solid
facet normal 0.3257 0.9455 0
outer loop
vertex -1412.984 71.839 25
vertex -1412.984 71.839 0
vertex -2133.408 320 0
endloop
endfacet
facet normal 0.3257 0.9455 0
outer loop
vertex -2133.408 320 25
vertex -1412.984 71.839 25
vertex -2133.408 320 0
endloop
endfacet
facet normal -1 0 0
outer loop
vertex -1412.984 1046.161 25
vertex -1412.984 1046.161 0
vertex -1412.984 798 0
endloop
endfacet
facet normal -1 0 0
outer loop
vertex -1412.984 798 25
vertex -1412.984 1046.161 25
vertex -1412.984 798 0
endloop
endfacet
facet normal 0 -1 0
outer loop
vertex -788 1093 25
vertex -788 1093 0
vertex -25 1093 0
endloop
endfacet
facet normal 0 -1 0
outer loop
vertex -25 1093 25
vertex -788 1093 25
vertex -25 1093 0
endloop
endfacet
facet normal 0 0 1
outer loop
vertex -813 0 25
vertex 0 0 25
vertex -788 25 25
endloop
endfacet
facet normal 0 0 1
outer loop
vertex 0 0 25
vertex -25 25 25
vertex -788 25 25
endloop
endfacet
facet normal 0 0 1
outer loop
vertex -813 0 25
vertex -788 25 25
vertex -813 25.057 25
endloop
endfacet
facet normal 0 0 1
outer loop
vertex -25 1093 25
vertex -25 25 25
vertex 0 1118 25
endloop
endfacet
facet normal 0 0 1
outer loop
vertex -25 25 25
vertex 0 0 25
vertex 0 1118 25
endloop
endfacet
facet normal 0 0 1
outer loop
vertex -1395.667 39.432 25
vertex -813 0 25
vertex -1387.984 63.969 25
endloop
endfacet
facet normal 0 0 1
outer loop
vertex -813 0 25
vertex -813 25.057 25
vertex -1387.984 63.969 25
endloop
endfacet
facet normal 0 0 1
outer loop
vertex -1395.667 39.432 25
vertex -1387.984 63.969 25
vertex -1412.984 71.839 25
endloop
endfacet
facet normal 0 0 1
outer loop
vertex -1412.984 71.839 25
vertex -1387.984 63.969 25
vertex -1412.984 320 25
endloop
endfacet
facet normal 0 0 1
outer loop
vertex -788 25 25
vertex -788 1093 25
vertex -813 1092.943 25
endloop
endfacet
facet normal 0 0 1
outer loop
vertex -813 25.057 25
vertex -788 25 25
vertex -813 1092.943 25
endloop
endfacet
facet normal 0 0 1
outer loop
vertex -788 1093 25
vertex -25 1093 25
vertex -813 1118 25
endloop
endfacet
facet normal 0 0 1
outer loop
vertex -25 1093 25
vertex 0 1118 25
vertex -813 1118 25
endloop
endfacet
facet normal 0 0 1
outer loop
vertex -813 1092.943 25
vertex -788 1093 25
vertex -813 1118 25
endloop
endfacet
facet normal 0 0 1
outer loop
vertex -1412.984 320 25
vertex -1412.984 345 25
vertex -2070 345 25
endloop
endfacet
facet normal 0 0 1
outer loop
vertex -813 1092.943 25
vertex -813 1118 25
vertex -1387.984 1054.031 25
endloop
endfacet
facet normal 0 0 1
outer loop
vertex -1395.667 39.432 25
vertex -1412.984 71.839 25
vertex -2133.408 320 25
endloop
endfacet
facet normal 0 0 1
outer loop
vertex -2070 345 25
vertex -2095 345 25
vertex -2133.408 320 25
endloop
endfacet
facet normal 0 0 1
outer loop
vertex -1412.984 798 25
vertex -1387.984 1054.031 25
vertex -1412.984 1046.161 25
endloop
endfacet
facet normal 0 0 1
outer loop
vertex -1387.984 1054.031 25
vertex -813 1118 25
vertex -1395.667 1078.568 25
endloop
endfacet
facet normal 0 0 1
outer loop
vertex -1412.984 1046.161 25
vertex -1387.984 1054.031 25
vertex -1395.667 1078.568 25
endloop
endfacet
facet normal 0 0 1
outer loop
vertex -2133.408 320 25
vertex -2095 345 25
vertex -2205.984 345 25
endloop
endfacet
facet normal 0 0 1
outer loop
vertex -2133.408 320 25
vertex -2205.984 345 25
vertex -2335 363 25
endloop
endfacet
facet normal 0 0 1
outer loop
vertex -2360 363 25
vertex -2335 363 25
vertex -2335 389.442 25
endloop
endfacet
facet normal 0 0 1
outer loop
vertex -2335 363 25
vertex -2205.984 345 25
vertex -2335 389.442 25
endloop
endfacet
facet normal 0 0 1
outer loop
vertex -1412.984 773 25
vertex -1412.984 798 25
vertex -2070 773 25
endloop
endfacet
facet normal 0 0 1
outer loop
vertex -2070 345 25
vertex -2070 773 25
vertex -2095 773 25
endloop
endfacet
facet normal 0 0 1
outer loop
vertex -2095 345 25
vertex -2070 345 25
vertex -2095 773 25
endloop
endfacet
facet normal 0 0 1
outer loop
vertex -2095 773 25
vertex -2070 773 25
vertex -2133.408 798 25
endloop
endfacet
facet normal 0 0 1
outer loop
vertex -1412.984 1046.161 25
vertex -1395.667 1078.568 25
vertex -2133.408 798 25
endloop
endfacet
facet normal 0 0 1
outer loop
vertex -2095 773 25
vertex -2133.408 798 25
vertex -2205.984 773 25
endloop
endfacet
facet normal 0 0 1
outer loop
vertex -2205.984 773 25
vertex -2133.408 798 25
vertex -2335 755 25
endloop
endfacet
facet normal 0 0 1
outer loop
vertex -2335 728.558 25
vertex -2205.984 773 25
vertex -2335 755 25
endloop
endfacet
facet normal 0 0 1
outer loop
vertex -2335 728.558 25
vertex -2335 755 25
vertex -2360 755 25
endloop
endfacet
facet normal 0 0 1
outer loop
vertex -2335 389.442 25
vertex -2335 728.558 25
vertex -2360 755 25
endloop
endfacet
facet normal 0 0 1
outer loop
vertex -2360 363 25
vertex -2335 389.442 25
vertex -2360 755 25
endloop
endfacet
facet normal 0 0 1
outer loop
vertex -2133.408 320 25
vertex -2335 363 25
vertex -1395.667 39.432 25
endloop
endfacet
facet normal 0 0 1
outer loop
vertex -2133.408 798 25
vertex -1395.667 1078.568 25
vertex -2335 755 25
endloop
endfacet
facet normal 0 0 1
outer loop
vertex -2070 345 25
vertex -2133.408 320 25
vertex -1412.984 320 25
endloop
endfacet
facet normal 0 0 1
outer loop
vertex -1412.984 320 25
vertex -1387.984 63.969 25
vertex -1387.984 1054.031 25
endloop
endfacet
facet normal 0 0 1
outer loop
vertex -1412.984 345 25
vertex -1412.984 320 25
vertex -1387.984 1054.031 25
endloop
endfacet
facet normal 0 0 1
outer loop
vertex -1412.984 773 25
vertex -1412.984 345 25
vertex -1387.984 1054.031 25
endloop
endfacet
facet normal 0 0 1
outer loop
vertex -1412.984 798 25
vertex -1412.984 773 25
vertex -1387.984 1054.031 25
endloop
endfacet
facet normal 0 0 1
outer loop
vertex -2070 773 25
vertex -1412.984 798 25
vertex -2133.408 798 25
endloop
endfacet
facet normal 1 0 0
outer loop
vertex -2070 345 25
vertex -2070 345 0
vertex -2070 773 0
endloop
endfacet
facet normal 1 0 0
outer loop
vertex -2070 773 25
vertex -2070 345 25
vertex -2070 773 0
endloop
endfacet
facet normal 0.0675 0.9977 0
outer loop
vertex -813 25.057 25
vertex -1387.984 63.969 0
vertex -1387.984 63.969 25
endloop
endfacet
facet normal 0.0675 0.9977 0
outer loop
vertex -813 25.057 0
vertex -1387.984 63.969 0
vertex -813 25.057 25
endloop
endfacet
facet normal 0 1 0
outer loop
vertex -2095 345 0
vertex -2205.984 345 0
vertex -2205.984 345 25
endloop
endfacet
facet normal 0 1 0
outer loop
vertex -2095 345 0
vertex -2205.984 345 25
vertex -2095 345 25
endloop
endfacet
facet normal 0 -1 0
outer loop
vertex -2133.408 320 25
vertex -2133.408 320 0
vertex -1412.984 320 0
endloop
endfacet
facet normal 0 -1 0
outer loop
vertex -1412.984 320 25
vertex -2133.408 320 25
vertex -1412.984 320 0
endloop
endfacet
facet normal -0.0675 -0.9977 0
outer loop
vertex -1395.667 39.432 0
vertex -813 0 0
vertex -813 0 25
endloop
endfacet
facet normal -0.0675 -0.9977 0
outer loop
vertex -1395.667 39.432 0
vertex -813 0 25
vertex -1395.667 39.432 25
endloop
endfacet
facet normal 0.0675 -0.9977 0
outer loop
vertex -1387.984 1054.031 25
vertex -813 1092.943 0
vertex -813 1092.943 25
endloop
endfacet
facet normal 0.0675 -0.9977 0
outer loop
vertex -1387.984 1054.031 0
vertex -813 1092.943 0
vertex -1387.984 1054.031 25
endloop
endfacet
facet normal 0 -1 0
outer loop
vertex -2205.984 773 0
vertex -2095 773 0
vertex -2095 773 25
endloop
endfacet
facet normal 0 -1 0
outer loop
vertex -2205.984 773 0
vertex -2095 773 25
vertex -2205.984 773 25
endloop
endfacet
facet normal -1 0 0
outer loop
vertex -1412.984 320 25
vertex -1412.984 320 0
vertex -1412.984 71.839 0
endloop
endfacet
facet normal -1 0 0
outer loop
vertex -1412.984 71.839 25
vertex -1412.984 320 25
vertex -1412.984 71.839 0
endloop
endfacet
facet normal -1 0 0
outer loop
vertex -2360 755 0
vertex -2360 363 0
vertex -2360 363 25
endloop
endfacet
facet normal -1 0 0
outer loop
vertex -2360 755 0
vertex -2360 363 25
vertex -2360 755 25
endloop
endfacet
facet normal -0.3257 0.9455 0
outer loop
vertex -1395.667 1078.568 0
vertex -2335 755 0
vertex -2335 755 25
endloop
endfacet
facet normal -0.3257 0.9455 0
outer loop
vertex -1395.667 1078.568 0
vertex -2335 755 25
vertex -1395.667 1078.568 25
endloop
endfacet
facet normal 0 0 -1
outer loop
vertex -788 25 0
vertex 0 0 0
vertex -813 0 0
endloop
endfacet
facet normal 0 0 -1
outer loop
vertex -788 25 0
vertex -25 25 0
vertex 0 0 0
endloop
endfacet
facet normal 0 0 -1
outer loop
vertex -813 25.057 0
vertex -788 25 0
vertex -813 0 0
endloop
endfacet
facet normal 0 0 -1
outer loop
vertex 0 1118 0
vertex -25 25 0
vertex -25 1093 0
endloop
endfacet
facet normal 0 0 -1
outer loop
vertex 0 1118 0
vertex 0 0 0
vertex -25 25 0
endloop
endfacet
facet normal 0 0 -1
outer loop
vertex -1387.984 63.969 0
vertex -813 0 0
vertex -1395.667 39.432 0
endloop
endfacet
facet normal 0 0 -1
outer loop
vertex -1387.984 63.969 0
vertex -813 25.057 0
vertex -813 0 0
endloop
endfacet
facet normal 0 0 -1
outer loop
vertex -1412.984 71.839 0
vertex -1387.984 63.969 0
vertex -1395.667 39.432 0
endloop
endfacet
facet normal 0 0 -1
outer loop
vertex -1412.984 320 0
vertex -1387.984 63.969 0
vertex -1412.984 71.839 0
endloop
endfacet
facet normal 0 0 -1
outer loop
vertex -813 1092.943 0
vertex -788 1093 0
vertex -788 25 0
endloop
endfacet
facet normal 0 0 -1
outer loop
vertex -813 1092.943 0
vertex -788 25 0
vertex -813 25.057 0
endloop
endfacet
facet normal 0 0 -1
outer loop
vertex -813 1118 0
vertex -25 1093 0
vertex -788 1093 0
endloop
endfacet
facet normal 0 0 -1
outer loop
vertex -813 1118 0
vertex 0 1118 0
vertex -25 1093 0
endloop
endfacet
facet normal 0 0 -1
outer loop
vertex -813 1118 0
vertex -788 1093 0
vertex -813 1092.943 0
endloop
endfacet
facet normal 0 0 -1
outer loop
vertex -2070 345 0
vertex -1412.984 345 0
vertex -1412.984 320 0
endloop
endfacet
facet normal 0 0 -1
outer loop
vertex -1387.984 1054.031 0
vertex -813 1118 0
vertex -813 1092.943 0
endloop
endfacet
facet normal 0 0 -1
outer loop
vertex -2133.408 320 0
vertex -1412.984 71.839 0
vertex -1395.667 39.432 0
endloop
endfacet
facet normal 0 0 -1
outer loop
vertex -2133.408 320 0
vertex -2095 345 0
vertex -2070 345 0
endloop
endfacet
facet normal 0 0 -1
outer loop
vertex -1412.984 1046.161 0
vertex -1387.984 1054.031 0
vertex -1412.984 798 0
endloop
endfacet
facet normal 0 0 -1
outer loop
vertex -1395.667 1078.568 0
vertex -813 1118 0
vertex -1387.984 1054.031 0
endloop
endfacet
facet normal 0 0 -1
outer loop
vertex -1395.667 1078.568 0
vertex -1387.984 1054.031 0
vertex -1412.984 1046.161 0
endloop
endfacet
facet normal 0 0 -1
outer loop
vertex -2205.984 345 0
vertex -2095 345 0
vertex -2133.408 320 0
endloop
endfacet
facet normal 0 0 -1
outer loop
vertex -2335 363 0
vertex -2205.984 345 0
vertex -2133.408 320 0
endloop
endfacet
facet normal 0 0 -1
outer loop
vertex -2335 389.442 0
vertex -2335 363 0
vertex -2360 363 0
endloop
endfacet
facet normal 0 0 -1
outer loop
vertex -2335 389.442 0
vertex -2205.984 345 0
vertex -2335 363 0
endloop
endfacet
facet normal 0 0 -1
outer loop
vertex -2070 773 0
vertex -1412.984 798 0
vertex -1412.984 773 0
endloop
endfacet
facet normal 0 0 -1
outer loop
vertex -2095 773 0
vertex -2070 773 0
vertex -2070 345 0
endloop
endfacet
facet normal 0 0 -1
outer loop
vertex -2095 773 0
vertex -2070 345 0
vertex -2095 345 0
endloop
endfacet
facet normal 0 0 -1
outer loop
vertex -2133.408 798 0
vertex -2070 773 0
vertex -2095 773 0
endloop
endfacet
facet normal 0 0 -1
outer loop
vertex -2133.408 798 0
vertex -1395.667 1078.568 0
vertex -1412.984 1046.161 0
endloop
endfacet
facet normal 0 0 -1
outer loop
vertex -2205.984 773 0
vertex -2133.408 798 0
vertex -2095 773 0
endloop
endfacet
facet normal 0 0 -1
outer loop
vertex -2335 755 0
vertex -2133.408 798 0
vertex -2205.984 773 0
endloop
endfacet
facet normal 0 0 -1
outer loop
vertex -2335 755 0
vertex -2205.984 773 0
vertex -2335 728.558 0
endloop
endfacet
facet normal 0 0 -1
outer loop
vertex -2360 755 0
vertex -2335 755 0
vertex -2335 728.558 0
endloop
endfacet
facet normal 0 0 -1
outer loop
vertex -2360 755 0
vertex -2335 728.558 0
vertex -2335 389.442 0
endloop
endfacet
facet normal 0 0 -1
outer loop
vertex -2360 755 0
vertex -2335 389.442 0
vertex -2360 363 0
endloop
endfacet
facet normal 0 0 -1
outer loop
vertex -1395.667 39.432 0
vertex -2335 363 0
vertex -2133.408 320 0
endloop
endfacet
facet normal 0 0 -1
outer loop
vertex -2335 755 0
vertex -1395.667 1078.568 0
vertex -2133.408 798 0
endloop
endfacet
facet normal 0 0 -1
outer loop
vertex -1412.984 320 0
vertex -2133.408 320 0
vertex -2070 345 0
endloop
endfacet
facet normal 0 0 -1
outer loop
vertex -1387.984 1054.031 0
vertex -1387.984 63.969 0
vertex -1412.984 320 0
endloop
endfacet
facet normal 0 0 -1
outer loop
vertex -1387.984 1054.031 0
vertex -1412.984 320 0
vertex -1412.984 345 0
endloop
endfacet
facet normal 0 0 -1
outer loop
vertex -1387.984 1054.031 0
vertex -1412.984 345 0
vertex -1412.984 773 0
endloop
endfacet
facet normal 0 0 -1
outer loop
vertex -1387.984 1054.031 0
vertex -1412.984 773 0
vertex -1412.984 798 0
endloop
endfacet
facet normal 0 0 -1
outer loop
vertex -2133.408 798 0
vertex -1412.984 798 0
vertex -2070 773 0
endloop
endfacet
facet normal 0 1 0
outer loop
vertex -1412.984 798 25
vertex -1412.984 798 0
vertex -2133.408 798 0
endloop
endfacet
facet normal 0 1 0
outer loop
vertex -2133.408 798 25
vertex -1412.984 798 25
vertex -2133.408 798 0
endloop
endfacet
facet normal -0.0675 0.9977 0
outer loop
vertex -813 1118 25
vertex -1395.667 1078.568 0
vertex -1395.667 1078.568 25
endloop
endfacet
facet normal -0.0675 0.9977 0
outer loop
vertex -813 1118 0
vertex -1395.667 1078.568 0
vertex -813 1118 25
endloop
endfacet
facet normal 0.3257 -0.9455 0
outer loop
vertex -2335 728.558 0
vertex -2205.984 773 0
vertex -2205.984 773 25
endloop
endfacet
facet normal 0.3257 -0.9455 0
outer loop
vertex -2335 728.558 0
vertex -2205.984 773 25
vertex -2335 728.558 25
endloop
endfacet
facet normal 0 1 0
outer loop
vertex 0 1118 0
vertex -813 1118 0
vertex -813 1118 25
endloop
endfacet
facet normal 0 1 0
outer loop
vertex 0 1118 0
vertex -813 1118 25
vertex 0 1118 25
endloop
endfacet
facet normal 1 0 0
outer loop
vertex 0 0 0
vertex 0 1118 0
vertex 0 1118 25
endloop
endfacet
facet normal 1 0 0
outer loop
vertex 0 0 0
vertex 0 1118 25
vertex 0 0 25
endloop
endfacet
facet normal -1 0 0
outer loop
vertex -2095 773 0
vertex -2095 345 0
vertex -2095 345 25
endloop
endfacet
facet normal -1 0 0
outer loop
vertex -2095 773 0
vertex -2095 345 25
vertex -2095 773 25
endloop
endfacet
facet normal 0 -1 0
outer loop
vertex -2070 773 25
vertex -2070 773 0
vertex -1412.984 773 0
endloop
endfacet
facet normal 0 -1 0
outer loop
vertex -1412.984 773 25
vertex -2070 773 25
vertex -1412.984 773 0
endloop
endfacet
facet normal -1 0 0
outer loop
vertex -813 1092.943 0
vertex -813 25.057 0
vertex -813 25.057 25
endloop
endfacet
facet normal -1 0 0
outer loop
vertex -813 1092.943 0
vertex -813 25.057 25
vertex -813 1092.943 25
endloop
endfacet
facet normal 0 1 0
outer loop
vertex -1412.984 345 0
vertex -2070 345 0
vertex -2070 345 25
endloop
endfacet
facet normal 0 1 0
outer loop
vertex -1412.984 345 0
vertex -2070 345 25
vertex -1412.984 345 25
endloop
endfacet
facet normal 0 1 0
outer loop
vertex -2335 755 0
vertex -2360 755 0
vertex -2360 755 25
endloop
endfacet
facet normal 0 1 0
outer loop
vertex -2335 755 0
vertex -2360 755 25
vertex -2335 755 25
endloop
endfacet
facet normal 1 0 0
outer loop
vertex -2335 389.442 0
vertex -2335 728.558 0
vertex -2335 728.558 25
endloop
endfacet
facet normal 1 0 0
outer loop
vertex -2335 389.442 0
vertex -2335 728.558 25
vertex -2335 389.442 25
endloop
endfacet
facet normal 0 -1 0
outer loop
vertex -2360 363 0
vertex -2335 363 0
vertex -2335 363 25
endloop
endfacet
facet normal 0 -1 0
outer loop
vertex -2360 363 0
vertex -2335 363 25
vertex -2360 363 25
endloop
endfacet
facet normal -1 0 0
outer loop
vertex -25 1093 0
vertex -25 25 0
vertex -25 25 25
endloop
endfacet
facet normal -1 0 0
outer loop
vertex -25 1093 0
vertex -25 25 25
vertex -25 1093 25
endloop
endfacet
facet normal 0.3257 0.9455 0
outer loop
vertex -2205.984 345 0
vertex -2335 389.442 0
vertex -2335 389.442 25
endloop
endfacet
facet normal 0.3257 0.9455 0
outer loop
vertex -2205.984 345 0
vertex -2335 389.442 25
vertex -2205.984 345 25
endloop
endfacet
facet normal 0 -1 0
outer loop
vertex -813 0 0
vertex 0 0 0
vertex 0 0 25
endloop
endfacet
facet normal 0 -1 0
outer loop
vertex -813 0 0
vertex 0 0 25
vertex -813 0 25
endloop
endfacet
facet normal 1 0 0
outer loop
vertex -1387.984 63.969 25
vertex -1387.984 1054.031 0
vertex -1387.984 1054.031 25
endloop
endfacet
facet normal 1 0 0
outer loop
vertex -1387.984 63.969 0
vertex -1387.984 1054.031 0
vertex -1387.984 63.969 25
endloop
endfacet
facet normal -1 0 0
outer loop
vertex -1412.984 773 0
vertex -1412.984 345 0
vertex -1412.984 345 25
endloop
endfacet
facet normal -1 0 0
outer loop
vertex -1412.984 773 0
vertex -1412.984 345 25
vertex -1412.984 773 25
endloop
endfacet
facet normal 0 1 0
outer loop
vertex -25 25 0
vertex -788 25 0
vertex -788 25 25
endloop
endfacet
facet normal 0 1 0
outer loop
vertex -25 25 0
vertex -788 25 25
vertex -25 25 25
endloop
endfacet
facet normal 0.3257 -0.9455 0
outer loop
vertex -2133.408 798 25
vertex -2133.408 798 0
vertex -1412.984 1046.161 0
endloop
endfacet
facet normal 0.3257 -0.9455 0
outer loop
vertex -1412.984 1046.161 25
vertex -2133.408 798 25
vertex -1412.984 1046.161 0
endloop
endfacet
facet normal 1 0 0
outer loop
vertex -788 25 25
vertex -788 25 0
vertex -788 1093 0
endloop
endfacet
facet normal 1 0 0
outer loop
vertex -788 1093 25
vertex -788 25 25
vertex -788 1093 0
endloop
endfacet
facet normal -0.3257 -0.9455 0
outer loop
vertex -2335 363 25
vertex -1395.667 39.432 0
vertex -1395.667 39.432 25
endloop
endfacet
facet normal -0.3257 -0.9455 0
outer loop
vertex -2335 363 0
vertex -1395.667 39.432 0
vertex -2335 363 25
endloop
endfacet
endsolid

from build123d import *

# Parameters (mm, degrees)
SKETCH_W   = 657.016146
SKETCH_H   = 428
SKETCH_W_2 = 763
SKETCH_H_2 = 1068
PAD_DEPTH  = 25


with BuildPart() as part:
    # Sketch → Pad (new body)
    with BuildSketch(Plane.XY):
        Polygon((0, 0), (-813, 0), (-1395.667241, 39.432052), (-2335, 363), (-2360, 363), (-2360, 755), (-2335, 755), (-1395.667241, 1078.567948), (-813, 1118), (0, 1118), align=None)
        Polygon((-2335, 728.558359), (-2335, 389.441641), (-2205.983854, 345), (-2095, 345), (-2095, 773), (-2205.983854, 773), align=None, mode=Mode.SUBTRACT)
        with Locations((-1741.491927, 559)):
            Rectangle(SKETCH_W, SKETCH_H, mode=Mode.SUBTRACT)
        Polygon((-2133.407695, 798), (-1412.983854, 1046.161327), (-1412.983854, 798), align=None, mode=Mode.SUBTRACT)
        Polygon((-2133.407695, 320), (-1412.983854, 320), (-1412.983854, 71.838673), align=None, mode=Mode.SUBTRACT)
        Polygon((-1387.983854, 1054.030739), (-1387.983854, 63.969261), (-813, 25.057184), (-813, 1092.942816), align=None, mode=Mode.SUBTRACT)
        with Locations((-406.5, 559)):
            Rectangle(SKETCH_W_2, SKETCH_H_2, mode=Mode.SUBTRACT)
    extrude(amount=PAD_DEPTH)


solid = part.part
